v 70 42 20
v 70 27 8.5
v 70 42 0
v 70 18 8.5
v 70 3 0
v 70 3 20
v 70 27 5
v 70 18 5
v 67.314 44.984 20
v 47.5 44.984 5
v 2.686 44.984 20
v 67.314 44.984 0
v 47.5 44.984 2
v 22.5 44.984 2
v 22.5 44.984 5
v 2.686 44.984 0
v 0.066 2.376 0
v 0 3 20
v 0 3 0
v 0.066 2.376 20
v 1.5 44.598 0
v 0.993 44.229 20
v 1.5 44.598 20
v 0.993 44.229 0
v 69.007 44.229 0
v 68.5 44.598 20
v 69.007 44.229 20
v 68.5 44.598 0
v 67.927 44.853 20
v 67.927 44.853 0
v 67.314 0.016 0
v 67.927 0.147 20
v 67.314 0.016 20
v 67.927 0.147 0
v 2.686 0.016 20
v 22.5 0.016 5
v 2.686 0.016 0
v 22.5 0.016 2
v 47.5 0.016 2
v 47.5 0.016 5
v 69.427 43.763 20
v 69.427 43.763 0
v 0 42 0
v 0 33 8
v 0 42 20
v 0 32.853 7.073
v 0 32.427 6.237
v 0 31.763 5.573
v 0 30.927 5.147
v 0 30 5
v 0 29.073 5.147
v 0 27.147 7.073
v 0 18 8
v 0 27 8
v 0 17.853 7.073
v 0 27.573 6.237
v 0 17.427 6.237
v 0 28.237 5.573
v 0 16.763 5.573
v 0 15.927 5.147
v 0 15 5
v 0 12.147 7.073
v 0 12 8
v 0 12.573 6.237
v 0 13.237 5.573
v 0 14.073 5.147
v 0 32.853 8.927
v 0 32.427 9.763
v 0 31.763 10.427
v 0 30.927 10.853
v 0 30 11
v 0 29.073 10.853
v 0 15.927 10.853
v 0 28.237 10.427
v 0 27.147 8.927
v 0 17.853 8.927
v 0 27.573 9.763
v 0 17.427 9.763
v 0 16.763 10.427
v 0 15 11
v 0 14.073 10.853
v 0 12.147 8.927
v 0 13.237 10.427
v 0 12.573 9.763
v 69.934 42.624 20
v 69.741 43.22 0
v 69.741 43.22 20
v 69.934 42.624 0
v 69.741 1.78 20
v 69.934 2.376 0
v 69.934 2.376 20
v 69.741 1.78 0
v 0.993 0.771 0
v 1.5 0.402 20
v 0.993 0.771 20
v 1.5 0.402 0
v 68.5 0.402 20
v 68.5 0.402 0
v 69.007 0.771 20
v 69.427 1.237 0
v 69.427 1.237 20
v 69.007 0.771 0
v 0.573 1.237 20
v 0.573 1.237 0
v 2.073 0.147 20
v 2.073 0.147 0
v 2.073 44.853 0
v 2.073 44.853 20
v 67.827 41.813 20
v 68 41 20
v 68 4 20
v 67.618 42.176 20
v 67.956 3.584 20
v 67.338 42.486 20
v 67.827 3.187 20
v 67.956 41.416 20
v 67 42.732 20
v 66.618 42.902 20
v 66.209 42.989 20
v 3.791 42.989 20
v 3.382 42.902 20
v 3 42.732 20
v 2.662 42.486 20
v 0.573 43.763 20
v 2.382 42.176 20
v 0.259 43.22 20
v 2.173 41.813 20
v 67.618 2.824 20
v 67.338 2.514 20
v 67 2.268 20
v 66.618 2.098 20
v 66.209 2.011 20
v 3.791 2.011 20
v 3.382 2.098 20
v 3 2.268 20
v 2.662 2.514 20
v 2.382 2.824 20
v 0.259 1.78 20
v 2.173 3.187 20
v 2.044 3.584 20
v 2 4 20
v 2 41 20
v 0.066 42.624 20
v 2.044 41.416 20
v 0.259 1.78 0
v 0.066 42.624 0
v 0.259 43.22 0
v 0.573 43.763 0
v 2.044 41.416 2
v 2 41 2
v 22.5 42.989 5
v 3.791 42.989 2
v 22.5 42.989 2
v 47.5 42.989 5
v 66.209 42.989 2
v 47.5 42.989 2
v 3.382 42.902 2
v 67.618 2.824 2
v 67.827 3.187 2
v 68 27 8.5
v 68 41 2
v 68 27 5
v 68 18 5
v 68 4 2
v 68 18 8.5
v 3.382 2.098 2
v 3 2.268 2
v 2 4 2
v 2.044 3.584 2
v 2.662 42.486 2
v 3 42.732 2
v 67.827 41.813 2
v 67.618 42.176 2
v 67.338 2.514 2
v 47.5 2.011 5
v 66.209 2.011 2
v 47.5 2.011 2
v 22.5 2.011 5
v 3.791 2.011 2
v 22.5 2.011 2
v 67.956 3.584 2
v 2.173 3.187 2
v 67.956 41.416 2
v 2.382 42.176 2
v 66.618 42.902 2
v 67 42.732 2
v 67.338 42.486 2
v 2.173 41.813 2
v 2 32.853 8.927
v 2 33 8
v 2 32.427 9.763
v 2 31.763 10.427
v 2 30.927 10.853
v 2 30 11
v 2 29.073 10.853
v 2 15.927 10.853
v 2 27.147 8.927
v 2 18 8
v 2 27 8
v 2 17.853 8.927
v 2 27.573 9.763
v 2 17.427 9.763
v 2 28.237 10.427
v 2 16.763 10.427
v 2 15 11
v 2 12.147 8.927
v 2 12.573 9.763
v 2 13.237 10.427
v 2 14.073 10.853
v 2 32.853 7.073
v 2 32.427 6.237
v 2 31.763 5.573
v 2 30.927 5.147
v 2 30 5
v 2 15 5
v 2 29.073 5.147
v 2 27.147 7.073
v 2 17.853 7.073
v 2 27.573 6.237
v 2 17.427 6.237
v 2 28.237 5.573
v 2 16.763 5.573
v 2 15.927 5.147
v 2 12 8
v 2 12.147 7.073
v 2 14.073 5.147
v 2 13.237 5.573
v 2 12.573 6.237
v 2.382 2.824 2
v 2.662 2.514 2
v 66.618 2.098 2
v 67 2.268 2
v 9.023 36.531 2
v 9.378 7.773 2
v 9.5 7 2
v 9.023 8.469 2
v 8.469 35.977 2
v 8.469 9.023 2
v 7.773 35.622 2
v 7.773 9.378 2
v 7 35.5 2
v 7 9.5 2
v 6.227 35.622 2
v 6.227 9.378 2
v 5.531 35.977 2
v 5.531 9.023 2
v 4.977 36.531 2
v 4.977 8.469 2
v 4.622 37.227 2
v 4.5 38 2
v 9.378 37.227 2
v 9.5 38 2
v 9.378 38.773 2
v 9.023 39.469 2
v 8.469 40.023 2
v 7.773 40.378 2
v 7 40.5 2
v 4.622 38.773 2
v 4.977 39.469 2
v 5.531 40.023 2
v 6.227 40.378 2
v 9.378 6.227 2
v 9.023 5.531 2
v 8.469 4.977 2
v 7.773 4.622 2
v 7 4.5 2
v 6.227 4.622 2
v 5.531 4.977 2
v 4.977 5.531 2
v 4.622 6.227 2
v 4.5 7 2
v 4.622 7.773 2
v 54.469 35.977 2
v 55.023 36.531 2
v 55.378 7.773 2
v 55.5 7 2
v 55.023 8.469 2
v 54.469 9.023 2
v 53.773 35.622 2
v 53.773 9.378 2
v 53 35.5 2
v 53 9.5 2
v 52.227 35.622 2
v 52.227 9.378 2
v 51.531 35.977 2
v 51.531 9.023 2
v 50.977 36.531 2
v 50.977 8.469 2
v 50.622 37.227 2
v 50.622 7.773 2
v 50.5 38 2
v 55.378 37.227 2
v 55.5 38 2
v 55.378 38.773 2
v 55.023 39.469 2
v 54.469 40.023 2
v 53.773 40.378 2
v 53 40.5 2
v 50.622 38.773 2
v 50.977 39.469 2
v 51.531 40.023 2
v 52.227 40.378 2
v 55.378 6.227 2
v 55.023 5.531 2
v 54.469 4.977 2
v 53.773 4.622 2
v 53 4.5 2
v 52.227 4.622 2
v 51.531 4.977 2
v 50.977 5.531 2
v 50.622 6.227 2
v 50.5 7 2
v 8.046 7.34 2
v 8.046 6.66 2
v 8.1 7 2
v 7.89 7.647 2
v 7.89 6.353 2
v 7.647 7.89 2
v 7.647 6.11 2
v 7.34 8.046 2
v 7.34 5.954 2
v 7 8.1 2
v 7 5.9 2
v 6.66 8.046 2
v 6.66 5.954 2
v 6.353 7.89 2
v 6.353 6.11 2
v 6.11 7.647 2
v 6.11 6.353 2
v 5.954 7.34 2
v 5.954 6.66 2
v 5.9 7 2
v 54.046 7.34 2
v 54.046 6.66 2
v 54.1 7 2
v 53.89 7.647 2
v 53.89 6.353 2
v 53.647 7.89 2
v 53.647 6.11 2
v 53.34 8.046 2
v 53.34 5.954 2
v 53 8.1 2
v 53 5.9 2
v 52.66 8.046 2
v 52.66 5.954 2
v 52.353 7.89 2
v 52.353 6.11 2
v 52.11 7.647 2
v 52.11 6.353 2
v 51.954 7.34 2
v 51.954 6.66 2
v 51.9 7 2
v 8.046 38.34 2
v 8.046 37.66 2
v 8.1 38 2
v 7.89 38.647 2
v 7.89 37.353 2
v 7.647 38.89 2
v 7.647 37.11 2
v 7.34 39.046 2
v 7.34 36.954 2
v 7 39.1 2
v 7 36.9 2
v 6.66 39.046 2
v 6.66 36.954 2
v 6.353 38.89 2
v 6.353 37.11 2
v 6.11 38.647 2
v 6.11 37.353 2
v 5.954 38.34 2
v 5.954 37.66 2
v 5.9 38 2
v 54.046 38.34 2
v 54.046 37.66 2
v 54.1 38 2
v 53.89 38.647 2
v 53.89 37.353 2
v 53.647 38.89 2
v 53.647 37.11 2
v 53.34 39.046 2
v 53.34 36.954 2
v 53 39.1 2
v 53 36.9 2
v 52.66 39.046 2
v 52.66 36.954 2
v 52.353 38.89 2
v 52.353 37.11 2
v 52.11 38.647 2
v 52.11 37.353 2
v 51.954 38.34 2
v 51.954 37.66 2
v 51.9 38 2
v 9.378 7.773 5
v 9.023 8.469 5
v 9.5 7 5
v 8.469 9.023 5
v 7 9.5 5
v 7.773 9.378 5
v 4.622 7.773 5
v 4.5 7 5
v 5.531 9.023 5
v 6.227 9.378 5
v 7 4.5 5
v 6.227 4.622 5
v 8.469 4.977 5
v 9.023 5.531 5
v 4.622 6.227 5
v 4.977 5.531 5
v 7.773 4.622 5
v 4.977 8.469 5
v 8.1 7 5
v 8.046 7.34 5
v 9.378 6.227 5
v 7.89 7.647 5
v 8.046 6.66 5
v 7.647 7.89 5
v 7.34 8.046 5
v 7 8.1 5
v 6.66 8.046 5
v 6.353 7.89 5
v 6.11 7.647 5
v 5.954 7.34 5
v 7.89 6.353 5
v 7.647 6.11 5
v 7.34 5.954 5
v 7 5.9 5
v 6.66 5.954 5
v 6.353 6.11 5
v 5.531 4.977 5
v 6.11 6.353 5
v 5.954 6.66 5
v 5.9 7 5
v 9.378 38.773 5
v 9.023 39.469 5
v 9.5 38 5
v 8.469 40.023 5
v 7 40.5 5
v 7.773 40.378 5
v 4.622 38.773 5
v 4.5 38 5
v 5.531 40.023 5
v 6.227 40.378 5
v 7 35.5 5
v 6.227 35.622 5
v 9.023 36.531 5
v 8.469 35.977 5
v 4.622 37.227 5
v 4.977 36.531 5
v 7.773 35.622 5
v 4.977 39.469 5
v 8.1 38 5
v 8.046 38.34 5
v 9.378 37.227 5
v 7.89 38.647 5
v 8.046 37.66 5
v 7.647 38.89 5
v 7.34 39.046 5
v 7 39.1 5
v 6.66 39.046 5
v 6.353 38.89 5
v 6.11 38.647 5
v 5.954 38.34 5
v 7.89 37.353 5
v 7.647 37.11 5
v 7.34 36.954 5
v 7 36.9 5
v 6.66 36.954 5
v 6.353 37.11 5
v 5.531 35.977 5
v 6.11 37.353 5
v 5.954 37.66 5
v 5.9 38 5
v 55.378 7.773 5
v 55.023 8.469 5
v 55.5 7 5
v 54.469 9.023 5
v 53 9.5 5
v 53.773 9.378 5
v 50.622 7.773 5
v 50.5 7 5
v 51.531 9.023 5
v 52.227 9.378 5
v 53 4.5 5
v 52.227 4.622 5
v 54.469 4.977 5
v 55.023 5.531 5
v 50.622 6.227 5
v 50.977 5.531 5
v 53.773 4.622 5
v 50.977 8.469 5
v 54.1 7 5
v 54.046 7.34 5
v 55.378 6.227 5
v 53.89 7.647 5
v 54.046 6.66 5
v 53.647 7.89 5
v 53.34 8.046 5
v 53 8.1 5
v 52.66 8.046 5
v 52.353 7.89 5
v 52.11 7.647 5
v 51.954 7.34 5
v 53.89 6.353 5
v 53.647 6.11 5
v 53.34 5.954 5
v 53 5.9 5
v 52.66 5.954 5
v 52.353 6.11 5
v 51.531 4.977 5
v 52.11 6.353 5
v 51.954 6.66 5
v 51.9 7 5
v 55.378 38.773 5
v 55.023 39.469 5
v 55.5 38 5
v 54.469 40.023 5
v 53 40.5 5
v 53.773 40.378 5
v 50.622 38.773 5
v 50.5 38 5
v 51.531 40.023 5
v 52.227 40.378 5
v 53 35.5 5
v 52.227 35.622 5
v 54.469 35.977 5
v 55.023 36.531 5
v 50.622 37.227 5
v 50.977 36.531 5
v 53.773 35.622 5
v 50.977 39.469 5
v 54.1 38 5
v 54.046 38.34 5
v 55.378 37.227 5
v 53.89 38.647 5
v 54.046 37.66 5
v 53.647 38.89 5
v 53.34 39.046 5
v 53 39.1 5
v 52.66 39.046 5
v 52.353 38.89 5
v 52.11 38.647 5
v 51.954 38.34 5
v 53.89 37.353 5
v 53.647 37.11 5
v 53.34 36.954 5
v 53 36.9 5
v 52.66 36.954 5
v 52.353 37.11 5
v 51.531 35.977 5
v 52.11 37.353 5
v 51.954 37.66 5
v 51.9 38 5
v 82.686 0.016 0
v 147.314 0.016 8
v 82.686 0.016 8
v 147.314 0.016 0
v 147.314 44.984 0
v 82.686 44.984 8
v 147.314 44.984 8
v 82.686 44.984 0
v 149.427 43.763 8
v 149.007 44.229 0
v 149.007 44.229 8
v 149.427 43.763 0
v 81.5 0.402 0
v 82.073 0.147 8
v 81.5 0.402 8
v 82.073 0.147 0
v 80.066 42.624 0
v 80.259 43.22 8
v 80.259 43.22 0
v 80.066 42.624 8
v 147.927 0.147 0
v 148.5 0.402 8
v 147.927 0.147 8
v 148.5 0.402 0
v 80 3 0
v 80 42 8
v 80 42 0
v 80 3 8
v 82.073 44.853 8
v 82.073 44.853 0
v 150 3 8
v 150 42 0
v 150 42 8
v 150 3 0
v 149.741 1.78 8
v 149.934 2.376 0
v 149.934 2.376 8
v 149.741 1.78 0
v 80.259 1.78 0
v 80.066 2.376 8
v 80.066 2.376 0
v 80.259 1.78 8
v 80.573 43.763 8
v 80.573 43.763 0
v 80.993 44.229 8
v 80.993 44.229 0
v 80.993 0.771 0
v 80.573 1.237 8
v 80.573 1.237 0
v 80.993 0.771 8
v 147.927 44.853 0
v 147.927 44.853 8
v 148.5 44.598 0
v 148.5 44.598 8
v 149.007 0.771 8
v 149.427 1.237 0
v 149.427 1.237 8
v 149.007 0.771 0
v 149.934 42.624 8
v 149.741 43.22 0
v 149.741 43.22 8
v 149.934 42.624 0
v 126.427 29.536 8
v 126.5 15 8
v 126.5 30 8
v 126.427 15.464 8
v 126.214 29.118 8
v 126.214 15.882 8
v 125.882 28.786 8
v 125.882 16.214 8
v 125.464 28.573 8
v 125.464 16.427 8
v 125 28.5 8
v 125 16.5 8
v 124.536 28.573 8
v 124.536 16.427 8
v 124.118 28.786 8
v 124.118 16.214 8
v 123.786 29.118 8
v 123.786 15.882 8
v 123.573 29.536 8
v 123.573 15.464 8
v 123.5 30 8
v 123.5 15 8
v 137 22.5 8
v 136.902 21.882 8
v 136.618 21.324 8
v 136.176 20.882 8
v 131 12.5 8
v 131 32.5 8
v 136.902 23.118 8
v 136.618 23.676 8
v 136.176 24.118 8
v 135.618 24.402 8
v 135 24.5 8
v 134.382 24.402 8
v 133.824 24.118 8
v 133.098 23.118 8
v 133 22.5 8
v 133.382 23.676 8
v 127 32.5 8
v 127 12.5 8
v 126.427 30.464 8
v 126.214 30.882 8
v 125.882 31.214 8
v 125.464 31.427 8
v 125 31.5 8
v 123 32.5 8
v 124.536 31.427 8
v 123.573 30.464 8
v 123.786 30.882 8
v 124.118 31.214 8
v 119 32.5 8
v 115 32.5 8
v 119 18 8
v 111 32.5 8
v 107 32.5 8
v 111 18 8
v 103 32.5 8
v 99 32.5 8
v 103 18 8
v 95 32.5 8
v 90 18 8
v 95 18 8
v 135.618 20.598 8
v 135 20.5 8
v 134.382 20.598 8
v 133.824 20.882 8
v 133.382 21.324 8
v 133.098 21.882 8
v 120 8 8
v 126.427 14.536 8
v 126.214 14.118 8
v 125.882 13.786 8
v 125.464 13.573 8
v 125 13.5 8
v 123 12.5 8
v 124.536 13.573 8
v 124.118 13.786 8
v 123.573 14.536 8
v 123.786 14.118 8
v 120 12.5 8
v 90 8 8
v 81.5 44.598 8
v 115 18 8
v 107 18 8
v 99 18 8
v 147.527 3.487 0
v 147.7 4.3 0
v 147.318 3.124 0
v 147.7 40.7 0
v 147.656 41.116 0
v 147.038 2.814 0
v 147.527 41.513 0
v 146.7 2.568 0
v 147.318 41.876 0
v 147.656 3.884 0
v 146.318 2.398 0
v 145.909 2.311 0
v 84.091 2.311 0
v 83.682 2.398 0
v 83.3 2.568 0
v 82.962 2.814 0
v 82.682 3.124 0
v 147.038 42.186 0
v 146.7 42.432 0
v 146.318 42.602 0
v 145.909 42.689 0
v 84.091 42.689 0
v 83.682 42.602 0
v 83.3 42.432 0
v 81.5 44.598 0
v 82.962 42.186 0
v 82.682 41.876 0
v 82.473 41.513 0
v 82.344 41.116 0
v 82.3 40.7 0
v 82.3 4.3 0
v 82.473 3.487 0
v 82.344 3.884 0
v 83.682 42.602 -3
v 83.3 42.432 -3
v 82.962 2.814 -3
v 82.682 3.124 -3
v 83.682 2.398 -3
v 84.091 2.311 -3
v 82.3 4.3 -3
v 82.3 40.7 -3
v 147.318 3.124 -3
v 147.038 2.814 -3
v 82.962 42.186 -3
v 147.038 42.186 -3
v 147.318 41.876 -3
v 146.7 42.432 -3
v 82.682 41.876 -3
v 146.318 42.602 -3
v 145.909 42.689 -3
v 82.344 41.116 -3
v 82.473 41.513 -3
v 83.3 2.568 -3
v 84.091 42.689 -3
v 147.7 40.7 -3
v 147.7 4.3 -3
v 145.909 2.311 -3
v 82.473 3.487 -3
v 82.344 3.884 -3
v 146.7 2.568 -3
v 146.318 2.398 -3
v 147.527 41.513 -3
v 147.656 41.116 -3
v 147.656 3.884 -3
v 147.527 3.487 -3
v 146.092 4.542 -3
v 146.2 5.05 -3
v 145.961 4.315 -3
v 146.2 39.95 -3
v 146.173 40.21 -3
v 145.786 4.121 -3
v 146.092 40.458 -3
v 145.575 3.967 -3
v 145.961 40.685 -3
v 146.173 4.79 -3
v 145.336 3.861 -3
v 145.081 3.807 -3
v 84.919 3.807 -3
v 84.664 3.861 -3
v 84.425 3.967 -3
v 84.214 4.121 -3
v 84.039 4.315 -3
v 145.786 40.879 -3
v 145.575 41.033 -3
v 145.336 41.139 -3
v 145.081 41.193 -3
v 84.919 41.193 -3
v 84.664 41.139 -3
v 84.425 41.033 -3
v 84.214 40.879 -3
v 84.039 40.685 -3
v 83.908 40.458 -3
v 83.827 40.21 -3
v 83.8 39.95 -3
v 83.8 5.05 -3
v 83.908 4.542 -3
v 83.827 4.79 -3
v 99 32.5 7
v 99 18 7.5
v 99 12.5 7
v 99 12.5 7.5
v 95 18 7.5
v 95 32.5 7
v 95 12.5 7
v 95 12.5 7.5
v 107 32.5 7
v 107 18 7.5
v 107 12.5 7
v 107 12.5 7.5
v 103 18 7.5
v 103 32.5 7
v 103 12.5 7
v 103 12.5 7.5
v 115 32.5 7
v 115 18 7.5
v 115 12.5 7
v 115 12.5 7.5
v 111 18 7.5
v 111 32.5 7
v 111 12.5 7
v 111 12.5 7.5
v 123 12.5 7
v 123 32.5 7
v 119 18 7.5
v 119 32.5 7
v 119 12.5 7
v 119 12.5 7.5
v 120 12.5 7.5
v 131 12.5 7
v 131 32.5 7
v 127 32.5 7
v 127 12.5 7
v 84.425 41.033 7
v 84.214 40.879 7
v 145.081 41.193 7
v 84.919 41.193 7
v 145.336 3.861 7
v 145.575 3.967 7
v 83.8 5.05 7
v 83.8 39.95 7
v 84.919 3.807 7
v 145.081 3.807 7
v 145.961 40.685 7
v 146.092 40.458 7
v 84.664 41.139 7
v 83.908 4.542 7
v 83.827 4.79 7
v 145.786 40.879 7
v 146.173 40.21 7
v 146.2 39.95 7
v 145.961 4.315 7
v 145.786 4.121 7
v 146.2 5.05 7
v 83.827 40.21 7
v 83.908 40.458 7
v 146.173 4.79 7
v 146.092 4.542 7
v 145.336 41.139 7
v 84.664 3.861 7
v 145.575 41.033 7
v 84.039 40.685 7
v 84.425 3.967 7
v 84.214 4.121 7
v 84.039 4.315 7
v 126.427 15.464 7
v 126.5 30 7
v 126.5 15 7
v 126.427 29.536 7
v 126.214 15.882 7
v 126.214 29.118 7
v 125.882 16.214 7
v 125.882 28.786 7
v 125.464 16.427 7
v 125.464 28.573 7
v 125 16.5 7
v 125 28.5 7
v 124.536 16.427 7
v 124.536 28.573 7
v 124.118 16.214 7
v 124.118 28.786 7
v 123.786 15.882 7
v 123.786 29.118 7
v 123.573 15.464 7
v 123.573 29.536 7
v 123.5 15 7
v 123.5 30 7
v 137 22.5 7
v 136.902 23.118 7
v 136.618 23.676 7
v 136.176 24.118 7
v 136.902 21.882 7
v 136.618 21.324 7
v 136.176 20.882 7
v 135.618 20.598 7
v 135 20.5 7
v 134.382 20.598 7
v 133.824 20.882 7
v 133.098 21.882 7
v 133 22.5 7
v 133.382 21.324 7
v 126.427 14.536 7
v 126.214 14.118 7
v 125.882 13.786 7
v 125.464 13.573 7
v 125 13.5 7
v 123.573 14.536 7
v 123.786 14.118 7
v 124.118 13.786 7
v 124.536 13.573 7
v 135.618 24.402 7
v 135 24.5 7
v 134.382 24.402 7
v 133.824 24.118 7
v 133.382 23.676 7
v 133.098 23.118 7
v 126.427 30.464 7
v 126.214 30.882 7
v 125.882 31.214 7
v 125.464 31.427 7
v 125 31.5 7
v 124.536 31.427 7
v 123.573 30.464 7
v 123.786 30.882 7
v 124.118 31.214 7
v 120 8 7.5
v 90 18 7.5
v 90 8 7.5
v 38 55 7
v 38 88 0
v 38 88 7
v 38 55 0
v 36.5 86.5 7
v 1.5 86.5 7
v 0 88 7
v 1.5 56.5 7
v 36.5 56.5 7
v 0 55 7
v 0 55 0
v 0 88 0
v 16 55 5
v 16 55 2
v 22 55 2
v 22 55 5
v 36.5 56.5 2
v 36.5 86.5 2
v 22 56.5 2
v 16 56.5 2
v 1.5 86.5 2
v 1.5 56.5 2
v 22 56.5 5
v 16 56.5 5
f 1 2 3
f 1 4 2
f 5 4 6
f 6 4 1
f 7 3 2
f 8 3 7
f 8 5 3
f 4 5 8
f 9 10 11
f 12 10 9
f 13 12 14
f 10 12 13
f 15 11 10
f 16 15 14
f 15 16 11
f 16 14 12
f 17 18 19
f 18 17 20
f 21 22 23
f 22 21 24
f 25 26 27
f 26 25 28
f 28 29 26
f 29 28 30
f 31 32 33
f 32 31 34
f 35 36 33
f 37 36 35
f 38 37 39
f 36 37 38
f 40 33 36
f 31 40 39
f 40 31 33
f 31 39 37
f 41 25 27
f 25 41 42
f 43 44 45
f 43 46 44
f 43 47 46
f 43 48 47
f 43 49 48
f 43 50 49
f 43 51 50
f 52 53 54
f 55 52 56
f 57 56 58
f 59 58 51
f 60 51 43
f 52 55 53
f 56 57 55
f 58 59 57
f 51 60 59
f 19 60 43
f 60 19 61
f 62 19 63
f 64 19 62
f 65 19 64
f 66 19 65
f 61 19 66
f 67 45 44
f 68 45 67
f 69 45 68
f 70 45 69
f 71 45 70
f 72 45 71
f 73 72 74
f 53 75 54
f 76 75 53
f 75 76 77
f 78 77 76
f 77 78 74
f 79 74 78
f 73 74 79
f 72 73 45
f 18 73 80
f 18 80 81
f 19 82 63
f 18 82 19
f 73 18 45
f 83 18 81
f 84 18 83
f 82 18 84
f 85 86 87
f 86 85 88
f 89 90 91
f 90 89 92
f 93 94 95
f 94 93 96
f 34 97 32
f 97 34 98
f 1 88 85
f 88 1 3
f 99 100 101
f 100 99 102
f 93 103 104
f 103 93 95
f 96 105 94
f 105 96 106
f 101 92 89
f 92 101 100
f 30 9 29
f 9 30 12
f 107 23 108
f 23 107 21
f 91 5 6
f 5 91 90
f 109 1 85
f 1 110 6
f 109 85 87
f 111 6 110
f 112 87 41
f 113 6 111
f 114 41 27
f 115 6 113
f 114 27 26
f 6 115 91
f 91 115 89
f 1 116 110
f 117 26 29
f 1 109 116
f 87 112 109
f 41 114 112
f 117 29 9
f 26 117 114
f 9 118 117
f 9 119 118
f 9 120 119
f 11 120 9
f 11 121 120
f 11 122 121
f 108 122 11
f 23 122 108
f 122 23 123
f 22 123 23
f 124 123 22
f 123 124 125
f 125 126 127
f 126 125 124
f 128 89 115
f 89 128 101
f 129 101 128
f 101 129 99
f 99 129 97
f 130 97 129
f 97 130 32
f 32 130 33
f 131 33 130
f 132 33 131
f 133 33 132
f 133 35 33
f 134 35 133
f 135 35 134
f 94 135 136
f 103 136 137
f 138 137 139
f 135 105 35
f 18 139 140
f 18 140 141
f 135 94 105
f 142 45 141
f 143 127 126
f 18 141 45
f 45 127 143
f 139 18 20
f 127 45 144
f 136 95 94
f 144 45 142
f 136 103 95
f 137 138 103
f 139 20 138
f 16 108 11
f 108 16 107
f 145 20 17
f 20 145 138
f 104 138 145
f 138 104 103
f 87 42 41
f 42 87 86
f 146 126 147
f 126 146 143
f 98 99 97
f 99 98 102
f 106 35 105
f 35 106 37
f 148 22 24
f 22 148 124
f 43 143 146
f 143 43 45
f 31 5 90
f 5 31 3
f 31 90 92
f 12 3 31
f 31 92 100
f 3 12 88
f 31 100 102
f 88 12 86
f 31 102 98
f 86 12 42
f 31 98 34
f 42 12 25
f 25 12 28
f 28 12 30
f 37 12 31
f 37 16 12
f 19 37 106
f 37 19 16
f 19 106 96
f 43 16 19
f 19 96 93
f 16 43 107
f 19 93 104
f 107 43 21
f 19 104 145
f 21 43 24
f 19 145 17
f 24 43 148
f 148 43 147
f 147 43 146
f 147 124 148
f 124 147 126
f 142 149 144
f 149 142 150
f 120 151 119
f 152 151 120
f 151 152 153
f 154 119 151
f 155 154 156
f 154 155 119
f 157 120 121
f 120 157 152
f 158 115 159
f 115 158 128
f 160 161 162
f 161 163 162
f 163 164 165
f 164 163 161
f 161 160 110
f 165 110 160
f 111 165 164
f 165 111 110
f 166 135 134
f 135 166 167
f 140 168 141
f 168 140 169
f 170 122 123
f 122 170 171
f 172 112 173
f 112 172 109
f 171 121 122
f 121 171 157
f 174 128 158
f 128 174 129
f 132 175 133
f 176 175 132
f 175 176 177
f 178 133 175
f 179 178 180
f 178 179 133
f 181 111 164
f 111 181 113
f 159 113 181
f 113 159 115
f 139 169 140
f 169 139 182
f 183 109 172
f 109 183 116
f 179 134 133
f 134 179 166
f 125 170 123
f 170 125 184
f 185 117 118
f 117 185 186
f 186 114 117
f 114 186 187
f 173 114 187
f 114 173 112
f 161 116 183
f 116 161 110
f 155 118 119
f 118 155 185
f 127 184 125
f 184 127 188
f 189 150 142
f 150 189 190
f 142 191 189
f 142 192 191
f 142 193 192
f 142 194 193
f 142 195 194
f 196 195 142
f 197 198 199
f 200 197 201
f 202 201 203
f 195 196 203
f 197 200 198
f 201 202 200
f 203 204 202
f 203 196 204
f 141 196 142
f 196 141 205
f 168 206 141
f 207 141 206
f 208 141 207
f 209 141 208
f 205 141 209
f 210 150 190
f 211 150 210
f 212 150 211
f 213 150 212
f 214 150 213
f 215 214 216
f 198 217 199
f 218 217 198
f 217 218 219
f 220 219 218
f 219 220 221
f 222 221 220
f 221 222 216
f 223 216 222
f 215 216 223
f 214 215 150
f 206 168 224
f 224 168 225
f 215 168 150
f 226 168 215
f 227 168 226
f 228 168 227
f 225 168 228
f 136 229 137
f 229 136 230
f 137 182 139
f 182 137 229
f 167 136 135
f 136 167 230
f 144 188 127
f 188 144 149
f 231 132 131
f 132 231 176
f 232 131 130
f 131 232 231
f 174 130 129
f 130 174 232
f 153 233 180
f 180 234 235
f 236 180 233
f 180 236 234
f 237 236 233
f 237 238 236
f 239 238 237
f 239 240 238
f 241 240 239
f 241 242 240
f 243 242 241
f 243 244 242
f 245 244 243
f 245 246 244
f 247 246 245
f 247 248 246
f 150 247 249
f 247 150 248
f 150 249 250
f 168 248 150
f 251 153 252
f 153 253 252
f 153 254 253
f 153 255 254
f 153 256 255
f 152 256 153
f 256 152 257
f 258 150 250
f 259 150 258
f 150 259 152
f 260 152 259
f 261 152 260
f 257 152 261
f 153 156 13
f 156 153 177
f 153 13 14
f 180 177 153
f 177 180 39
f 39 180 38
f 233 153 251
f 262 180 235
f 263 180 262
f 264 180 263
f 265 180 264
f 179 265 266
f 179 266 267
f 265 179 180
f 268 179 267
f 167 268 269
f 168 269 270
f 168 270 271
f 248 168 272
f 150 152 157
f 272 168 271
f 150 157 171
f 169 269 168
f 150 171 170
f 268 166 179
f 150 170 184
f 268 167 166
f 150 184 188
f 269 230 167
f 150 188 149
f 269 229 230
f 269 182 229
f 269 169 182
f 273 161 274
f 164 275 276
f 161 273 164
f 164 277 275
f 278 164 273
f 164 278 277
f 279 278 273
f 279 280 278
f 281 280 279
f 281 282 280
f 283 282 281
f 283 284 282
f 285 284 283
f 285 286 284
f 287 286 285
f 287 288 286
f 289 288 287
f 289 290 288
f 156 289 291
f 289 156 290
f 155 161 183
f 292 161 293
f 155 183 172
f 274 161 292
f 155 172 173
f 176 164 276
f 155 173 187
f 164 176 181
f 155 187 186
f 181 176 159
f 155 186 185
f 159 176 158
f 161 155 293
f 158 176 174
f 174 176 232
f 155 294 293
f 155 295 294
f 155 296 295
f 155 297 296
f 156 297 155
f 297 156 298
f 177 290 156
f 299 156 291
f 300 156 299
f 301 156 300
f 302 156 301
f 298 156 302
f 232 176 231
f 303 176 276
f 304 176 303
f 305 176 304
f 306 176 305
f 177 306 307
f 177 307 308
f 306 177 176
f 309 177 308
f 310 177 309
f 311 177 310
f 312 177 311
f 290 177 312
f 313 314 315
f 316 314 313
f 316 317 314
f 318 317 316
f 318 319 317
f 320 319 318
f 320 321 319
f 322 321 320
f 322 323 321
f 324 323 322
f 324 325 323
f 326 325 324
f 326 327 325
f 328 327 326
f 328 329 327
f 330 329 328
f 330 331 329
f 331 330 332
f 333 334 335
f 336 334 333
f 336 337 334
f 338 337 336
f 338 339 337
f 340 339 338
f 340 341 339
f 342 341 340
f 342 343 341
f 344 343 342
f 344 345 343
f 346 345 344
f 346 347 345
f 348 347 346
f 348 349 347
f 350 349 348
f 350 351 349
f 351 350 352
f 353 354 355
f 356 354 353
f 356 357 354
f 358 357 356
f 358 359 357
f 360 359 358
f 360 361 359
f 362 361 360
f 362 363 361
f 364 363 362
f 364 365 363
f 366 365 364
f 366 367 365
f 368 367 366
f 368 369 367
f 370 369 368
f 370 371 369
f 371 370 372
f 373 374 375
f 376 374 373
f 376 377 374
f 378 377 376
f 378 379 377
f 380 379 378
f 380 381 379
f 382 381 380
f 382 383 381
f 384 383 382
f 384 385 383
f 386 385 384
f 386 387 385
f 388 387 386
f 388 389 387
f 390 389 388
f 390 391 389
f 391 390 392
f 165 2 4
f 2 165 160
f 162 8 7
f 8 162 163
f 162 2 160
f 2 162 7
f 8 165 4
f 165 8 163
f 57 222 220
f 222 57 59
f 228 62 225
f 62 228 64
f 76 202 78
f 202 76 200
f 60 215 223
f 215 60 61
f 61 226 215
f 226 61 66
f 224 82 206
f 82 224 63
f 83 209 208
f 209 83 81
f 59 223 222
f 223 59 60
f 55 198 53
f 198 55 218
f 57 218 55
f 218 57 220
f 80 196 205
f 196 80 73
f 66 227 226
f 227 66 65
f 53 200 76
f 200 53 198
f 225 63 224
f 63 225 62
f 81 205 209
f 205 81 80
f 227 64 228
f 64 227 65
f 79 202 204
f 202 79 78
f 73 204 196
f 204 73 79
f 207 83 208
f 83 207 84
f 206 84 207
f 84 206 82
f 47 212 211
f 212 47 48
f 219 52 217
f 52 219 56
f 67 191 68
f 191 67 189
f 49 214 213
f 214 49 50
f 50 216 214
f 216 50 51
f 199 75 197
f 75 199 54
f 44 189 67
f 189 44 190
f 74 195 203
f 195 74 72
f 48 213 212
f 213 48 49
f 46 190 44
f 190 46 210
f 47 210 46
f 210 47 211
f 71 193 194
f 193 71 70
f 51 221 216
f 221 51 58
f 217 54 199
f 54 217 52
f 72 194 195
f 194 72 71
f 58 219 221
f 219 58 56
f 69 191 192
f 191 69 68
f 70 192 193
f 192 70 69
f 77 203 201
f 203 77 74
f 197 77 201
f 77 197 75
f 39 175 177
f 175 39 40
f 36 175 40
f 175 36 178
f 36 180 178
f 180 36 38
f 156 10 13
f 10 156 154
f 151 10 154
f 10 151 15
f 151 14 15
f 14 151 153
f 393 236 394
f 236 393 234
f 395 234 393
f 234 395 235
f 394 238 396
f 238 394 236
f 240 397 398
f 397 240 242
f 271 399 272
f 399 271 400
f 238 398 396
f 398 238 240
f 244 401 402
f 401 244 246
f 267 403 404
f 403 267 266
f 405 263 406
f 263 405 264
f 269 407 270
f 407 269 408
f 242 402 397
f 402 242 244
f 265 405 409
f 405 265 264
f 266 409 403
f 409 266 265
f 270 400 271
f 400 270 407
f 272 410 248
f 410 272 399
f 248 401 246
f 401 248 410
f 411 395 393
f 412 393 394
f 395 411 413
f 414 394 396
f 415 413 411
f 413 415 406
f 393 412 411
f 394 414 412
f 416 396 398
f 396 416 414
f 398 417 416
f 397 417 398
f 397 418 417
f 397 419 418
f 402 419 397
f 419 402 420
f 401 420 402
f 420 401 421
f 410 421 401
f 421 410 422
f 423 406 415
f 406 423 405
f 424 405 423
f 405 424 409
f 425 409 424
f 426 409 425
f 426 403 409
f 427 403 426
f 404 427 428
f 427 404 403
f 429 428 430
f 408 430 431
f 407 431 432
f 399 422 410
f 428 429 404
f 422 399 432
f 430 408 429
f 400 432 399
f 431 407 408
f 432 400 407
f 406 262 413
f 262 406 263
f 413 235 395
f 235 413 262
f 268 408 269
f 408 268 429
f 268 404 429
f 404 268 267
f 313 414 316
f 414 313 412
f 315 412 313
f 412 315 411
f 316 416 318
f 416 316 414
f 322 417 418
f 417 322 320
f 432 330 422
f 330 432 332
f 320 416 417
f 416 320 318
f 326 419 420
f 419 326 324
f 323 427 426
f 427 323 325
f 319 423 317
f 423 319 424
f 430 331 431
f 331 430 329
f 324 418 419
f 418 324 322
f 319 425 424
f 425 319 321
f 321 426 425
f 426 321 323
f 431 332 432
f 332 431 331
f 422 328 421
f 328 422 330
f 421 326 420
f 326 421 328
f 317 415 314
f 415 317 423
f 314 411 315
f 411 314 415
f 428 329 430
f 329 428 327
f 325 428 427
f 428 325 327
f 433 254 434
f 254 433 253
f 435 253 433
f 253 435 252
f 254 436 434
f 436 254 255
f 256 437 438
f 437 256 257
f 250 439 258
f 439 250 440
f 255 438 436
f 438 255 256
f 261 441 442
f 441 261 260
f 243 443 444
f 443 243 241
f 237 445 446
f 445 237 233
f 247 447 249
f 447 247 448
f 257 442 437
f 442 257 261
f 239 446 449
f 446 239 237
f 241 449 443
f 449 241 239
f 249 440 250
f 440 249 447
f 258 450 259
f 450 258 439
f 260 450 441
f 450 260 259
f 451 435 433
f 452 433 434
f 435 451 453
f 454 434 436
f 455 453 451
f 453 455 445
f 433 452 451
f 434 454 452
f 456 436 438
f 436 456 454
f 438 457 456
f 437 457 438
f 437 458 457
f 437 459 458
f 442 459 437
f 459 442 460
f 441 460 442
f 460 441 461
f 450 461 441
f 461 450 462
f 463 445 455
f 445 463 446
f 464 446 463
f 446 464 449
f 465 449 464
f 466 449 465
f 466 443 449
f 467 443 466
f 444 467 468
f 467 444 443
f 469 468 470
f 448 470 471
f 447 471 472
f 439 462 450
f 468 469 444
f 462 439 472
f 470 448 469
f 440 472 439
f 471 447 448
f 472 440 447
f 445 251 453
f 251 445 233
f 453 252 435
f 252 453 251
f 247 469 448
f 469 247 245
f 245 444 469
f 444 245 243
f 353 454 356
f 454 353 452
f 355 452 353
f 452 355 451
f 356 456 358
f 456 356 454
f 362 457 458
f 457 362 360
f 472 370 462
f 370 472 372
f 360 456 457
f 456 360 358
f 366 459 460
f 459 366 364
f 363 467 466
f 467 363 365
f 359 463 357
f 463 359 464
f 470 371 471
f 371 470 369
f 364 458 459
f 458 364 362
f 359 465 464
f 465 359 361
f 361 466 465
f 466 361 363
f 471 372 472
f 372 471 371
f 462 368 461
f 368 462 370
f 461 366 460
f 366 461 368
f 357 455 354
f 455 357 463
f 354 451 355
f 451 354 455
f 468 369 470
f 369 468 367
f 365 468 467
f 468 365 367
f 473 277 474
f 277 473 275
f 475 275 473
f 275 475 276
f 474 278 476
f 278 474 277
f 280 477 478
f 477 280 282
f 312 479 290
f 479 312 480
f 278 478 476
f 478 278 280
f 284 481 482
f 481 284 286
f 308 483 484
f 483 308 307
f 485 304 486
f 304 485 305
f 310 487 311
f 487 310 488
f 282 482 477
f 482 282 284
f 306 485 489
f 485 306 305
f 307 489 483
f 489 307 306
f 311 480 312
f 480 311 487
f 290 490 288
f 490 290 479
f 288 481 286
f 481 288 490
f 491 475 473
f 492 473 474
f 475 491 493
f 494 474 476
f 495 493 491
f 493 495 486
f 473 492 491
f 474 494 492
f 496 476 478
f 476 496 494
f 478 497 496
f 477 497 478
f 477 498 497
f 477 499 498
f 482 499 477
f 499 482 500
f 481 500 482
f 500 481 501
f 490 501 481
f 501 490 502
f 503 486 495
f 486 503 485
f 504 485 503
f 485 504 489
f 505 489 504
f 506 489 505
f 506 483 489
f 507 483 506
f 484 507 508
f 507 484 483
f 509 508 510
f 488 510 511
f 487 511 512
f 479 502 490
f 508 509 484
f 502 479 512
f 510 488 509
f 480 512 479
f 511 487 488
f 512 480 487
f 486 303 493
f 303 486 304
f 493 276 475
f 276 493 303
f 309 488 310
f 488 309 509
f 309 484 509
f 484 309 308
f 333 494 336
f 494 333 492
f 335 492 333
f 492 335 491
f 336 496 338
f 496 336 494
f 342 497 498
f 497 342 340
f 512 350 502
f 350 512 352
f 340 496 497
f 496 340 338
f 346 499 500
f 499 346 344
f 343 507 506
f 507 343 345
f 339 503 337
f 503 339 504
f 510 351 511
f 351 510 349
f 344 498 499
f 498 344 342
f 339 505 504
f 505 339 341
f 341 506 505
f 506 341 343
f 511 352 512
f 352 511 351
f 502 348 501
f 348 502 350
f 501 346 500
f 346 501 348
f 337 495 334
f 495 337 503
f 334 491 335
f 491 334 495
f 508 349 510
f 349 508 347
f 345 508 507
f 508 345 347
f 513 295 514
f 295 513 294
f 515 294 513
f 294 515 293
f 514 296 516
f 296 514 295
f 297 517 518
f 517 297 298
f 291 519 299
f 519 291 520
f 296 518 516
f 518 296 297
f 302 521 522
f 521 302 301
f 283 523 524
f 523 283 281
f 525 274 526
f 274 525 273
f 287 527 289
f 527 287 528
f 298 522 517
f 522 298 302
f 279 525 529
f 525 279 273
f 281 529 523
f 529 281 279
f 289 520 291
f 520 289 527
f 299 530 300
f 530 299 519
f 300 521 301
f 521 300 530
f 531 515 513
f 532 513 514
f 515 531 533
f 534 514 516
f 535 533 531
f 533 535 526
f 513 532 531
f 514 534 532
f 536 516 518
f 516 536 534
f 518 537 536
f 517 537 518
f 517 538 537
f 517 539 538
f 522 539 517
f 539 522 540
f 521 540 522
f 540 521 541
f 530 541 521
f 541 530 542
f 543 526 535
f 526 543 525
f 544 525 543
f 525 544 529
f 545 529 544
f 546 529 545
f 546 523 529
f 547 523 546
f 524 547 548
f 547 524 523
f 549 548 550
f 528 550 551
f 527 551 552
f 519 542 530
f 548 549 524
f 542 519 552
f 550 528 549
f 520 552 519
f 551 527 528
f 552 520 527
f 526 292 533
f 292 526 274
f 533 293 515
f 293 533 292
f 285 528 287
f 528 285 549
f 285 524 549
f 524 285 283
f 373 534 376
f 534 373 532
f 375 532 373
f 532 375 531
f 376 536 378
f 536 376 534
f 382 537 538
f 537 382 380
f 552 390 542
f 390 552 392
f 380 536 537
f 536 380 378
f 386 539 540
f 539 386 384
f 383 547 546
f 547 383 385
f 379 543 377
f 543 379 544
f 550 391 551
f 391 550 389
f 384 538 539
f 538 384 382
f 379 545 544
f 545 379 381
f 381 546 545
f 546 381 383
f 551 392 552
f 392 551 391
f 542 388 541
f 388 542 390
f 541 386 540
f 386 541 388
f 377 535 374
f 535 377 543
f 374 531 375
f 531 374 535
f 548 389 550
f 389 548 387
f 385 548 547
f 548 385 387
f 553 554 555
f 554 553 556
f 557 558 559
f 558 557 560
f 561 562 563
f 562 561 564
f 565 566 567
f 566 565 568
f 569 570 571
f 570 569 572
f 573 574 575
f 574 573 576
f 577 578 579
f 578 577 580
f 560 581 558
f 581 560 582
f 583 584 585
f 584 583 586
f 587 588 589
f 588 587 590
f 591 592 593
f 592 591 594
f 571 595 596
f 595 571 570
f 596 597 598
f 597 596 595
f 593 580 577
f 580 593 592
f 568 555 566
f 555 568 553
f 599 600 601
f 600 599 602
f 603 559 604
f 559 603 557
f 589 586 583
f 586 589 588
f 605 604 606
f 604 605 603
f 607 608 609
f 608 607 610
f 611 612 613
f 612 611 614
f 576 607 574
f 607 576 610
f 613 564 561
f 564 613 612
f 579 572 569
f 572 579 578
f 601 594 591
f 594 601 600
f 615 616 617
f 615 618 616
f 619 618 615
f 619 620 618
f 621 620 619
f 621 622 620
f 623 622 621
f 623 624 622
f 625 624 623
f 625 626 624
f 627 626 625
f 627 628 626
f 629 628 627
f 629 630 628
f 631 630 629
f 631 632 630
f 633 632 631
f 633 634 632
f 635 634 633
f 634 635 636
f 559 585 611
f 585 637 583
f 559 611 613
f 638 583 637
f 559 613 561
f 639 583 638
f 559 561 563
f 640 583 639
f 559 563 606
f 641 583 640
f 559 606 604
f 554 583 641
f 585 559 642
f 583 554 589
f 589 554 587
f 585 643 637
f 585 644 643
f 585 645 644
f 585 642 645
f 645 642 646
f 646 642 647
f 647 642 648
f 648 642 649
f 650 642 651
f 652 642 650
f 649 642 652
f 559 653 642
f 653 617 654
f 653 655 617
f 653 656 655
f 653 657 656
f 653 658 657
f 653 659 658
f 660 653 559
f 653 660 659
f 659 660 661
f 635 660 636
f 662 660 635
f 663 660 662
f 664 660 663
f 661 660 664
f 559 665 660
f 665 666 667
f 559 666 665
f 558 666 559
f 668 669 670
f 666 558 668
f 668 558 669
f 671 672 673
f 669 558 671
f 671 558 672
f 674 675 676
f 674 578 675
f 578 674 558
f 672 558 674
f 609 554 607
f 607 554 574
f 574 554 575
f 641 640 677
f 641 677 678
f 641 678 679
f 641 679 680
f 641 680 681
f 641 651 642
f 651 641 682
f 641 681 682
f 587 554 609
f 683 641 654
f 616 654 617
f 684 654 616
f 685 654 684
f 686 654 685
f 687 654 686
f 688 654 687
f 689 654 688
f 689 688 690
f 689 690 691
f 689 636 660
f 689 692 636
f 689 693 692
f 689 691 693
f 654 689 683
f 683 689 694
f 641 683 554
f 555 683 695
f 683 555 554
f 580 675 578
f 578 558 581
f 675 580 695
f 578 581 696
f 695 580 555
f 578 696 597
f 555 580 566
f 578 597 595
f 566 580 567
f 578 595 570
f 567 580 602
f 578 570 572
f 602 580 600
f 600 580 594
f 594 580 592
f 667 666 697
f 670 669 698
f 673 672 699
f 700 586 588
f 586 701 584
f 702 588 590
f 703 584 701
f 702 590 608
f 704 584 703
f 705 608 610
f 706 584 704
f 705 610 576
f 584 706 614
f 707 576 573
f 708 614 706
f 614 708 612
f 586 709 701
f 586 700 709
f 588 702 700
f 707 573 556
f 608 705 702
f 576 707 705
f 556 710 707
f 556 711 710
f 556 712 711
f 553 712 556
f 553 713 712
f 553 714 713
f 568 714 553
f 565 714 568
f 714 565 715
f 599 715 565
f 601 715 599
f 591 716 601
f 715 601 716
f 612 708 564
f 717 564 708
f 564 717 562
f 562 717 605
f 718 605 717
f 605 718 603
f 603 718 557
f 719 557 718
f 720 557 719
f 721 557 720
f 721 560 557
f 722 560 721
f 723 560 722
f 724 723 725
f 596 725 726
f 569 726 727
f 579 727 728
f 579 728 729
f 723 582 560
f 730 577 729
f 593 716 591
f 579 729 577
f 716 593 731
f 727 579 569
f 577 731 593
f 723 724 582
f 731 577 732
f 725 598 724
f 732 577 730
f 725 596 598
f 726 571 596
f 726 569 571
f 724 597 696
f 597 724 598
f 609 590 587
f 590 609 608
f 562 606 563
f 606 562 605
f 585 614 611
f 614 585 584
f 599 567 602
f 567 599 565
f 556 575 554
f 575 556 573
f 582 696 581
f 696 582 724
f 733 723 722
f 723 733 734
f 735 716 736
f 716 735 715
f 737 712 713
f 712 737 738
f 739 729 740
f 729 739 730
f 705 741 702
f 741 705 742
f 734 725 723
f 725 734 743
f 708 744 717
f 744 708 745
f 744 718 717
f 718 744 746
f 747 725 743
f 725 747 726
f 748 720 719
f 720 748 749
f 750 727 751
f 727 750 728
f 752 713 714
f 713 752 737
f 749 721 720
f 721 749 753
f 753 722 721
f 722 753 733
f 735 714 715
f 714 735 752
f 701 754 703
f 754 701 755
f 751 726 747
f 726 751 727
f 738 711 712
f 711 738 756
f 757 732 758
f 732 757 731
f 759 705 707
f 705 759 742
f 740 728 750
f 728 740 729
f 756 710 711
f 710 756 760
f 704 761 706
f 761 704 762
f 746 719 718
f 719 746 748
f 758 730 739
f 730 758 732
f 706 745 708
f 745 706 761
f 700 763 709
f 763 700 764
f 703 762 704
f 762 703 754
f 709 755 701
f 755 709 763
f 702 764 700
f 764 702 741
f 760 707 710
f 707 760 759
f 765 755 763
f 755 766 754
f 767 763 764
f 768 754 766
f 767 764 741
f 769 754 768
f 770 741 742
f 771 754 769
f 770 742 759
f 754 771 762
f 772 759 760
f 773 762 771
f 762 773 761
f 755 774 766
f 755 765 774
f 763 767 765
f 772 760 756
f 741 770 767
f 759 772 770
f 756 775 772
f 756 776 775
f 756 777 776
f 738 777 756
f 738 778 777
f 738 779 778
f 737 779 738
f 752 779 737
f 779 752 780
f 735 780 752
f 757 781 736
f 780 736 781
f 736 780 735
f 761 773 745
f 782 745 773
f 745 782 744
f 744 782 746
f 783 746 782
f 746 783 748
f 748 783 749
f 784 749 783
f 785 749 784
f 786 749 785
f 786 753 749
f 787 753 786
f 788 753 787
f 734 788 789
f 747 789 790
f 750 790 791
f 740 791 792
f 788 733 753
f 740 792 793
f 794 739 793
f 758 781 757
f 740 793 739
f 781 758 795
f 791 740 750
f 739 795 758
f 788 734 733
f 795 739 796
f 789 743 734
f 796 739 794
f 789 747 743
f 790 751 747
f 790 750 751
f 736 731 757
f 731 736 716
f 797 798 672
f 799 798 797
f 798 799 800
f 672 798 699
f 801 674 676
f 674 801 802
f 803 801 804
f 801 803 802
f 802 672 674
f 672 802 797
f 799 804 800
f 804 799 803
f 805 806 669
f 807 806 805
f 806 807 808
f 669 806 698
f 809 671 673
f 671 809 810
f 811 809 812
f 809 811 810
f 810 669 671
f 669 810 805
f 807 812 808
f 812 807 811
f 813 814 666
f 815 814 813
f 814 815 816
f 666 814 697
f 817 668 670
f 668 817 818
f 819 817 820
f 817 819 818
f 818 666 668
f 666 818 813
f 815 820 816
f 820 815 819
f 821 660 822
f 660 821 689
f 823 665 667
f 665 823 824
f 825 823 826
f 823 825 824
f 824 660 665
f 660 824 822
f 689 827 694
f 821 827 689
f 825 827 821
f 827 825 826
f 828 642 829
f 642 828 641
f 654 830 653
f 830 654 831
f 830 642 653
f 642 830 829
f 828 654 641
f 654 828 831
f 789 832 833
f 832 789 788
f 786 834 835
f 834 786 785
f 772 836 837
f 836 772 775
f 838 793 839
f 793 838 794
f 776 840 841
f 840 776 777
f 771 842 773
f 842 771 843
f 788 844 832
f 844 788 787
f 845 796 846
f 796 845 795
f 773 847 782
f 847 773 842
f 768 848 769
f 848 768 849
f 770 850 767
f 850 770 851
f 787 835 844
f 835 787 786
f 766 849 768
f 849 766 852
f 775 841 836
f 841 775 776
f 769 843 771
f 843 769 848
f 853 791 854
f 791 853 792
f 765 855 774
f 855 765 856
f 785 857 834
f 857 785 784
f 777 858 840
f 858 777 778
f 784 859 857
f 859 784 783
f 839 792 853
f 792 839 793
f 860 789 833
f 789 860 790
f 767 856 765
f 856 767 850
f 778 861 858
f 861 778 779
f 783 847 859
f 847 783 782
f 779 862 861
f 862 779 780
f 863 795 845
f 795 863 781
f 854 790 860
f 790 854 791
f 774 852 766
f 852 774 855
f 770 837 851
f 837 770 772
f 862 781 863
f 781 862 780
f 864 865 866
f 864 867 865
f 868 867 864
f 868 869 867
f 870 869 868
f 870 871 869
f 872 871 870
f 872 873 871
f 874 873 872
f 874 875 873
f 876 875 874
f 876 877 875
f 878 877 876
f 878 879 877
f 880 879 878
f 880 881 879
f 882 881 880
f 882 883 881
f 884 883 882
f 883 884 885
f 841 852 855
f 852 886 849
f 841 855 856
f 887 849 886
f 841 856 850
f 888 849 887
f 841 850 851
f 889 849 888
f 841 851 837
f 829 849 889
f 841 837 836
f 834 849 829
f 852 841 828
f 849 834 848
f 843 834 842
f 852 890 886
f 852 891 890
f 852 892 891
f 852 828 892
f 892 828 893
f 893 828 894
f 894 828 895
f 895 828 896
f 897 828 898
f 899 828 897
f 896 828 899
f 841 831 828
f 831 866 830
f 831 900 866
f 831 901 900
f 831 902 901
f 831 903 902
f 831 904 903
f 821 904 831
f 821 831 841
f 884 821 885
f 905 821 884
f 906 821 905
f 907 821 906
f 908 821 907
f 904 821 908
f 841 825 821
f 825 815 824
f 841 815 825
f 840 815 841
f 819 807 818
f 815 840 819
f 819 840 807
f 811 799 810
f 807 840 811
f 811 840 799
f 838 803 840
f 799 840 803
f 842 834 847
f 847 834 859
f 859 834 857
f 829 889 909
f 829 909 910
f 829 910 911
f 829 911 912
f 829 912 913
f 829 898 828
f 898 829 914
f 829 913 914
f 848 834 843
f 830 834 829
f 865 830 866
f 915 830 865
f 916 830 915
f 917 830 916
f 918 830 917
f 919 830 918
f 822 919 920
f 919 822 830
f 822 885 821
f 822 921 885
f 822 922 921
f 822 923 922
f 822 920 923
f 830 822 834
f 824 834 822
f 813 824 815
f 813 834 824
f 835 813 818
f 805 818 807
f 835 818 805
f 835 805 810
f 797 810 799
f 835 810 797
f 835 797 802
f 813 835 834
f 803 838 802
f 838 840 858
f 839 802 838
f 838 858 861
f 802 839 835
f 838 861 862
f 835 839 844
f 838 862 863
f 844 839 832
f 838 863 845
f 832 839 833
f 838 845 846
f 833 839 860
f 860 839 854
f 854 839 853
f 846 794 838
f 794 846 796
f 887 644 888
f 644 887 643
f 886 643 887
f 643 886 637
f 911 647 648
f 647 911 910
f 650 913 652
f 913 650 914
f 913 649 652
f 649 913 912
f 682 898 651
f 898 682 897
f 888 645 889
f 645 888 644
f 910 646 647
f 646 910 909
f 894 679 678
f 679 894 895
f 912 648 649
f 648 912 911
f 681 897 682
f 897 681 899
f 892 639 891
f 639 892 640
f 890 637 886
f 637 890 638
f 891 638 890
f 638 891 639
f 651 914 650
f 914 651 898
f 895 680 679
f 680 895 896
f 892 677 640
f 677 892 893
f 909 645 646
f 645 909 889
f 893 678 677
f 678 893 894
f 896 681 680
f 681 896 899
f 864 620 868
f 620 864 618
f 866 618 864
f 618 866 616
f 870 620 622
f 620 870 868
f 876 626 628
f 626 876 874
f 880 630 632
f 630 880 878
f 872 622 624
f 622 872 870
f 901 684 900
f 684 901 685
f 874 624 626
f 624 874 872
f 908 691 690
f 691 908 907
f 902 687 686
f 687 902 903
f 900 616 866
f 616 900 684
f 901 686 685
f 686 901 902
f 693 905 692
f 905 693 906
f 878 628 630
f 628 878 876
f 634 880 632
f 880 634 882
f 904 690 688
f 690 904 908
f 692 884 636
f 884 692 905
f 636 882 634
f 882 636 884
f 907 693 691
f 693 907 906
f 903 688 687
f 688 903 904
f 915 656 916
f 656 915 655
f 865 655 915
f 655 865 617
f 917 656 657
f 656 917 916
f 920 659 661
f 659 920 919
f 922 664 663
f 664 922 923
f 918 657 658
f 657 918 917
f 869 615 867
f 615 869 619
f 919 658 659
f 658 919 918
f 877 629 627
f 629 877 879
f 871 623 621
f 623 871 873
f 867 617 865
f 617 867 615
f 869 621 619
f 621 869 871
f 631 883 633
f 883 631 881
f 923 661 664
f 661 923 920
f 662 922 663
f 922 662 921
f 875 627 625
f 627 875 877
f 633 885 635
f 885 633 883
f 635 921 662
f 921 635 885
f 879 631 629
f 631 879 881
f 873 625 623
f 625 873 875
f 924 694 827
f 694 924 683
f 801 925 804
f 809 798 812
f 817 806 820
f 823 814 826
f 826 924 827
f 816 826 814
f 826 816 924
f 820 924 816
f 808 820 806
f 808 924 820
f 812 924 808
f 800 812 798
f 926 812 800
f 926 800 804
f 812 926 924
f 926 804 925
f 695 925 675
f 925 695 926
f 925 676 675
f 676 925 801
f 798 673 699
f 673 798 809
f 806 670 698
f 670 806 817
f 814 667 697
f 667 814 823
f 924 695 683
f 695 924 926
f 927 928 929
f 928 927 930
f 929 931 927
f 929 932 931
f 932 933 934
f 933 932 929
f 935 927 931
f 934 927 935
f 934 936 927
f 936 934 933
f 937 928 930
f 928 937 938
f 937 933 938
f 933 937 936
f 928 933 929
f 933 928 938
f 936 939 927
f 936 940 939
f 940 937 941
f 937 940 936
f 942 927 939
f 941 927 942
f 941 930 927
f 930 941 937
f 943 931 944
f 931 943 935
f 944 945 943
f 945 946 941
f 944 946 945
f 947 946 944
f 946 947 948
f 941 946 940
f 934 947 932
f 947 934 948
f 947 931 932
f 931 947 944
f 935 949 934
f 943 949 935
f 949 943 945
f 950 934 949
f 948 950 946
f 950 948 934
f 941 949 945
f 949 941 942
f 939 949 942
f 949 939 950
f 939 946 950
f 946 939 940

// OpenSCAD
/**
 * WIA EMG 2-Channel Enclosure
 * OpenSCAD Design File
 *
 * Version: 1.0.0
 * Author: WIA Standards Committee
 *
 * Designed for:
 * - ESP32-S3-DevKitC board
 * - Custom EMG amplifier PCB (50x30mm)
 * - LiPo battery (503035 - 30x35x5mm)
 *
 * Print Settings:
 * - Material: PLA or PETG
 * - Layer Height: 0.2mm
 * - Infill: 20%
 * - Supports: Yes (for USB port)
 */

// ============================================================================
// Parameters
// ============================================================================

// Enclosure dimensions
case_length = 70;      // mm
case_width = 45;       // mm
case_height = 25;      // mm
wall_thickness = 2;    // mm
corner_radius = 3;     // mm

// PCB dimensions
pcb_length = 50;       // mm
pcb_width = 30;        // mm
pcb_thickness = 1.6;   // mm
pcb_standoff = 3;      // mm

// ESP32 DevKit dimensions
esp32_length = 44;     // mm
esp32_width = 26;      // mm

// Battery dimensions
battery_length = 35;   // mm
battery_width = 30;    // mm
battery_height = 5;    // mm

// Connector holes
usb_c_width = 9;       // mm
usb_c_height = 3.5;    // mm
audio_jack_dia = 6;    // mm

// Button hole
button_dia = 4;        // mm

// LED holes
led_dia = 3;           // mm

// Strap slots
strap_width = 25;      // mm
strap_height = 3;      // mm

// ============================================================================
// Modules
// ============================================================================

// Rounded box
module rounded_box(l, w, h, r) {
    hull() {
        translate([r, r, 0])
            cylinder(h=h, r=r, $fn=30);
        translate([l-r, r, 0])
            cylinder(h=h, r=r, $fn=30);
        translate([r, w-r, 0])
            cylinder(h=h, r=r, $fn=30);
        translate([l-r, w-r, 0])
            cylinder(h=h, r=r, $fn=30);
    }
}

// PCB standoff
module standoff(h, d_outer, d_inner) {
    difference() {
        cylinder(h=h, d=d_outer, $fn=20);
        cylinder(h=h+1, d=d_inner, $fn=20);
    }
}

// Strap slot
module strap_slot(w, h, depth) {
    cube([w, depth, h]);
}

// ============================================================================
// Bottom Case
// ============================================================================

module case_bottom() {
    difference() {
        // Outer shell
        rounded_box(case_length, case_width, case_height - 5, corner_radius);

        // Inner cavity
        translate([wall_thickness, wall_thickness, wall_thickness])
            rounded_box(
                case_length - 2*wall_thickness,
                case_width - 2*wall_thickness,
                case_height,
                corner_radius - wall_thickness/2
            );

        // USB-C port hole
        translate([case_length - wall_thickness - 1, (case_width - usb_c_width)/2, wall_thickness + 3])
            cube([wall_thickness + 2, usb_c_width, usb_c_height]);

        // Audio jack holes (2x for electrode cables)
        translate([-1, case_width/3, wall_thickness + 6])
            rotate([0, 90, 0])
            cylinder(h=wall_thickness + 2, d=audio_jack_dia, $fn=20);

        translate([-1, 2*case_width/3, wall_thickness + 6])
            rotate([0, 90, 0])
            cylinder(h=wall_thickness + 2, d=audio_jack_dia, $fn=20);

        // Strap slots (both sides)
        translate([(case_length - strap_width)/2, -1, wall_thickness])
            strap_slot(strap_width, strap_height, wall_thickness + 2);

        translate([(case_length - strap_width)/2, case_width - wall_thickness - 1, wall_thickness])
            strap_slot(strap_width, strap_height, wall_thickness + 2);
    }

    // PCB standoffs
    standoff_positions = [
        [wall_thickness + 5, wall_thickness + 5],
        [wall_thickness + 5, case_width - wall_thickness - 5],
        [case_length - wall_thickness - 15, wall_thickness + 5],
        [case_length - wall_thickness - 15, case_width - wall_thickness - 5]
    ];

    for (pos = standoff_positions) {
        translate([pos[0], pos[1], wall_thickness])
            standoff(pcb_standoff, 5, 2.2);
    }
}

// ============================================================================
// Top Case (Lid)
// ============================================================================

module case_top() {
    lid_height = 8;
    lip_height = 3;
    lip_thickness = 1.5;

    difference() {
        union() {
            // Main lid
            rounded_box(case_length, case_width, lid_height, corner_radius);

            // Inner lip for snap fit
            translate([wall_thickness + 0.3, wall_thickness + 0.3, -lip_height])
                rounded_box(
                    case_length - 2*wall_thickness - 0.6,
                    case_width - 2*wall_thickness - 0.6,
                    lip_height,
                    corner_radius - wall_thickness/2
                );
        }

        // Hollow out the lip
        translate([wall_thickness + lip_thickness + 0.3, wall_thickness + lip_thickness + 0.3, -lip_height - 1])
            rounded_box(
                case_length - 2*wall_thickness - 2*lip_thickness - 0.6,
                case_width - 2*wall_thickness - 2*lip_thickness - 0.6,
                lip_height + lid_height,
                corner_radius - wall_thickness/2 - lip_thickness/2
            );

        // Button hole
        translate([case_length - 15, case_width/2, -1])
            cylinder(h=lid_height + 2, d=button_dia, $fn=20);

        // LED holes
        translate([case_length - 25, case_width/3, -1])
            cylinder(h=lid_height + 2, d=led_dia, $fn=20);

        translate([case_length - 25, 2*case_width/3, -1])
            cylinder(h=lid_height + 2, d=led_dia, $fn=20);

        // Ventilation slots
        for (i = [0:4]) {
            translate([15 + i*8, case_width/2 - 10, -1])
                cube([4, 20, lid_height + 2]);
        }

        // Label area (recessed)
        translate([10, 8, lid_height - 0.5])
            cube([30, 10, 1]);
    }
}

// ============================================================================
// Battery Holder
// ============================================================================

module battery_holder() {
    holder_wall = 1.5;

    difference() {
        cube([
            battery_length + 2*holder_wall,
            battery_width + 2*holder_wall,
            battery_height + 2
        ]);

        translate([holder_wall, holder_wall, 2])
            cube([battery_length, battery_width, battery_height + 1]);

        // Wire channel
        translate([battery_length/2 + holder_wall - 3, -1, 2])
            cube([6, holder_wall + 2, 3]);
    }
}

// ============================================================================
// Render Options
// ============================================================================

// Uncomment to render individual parts:

// Bottom case
case_bottom();

// Top case (translated for viewing)
translate([case_length + 10, 0, 0])
    case_top();

// Battery holder (translated for viewing)
translate([0, case_width + 10, 0])
    battery_holder();

// Assembly view (uncomment to see assembled)
/*
color("gray", 0.8)
    case_bottom();

color("gray", 0.6)
    translate([0, 0, case_height - 5 + 3])
    rotate([180, 0, 0])
    translate([0, -case_width, 0])
        case_top();
*/

// ============================================================================
// Export Notes
// ============================================================================
/*
To export STL files:
1. Comment out all but one module
2. Render (F6)
3. Export as STL (F7)

Files to export:
- wia_emg_case_bottom.stl
- wia_emg_case_top.stl
- wia_emg_battery_holder.stl (optional)

Print orientation:
- Bottom: Print as-is (flat bottom down)
- Top: Print upside down (flat top on bed)
- Battery holder: Print as-is
*/
